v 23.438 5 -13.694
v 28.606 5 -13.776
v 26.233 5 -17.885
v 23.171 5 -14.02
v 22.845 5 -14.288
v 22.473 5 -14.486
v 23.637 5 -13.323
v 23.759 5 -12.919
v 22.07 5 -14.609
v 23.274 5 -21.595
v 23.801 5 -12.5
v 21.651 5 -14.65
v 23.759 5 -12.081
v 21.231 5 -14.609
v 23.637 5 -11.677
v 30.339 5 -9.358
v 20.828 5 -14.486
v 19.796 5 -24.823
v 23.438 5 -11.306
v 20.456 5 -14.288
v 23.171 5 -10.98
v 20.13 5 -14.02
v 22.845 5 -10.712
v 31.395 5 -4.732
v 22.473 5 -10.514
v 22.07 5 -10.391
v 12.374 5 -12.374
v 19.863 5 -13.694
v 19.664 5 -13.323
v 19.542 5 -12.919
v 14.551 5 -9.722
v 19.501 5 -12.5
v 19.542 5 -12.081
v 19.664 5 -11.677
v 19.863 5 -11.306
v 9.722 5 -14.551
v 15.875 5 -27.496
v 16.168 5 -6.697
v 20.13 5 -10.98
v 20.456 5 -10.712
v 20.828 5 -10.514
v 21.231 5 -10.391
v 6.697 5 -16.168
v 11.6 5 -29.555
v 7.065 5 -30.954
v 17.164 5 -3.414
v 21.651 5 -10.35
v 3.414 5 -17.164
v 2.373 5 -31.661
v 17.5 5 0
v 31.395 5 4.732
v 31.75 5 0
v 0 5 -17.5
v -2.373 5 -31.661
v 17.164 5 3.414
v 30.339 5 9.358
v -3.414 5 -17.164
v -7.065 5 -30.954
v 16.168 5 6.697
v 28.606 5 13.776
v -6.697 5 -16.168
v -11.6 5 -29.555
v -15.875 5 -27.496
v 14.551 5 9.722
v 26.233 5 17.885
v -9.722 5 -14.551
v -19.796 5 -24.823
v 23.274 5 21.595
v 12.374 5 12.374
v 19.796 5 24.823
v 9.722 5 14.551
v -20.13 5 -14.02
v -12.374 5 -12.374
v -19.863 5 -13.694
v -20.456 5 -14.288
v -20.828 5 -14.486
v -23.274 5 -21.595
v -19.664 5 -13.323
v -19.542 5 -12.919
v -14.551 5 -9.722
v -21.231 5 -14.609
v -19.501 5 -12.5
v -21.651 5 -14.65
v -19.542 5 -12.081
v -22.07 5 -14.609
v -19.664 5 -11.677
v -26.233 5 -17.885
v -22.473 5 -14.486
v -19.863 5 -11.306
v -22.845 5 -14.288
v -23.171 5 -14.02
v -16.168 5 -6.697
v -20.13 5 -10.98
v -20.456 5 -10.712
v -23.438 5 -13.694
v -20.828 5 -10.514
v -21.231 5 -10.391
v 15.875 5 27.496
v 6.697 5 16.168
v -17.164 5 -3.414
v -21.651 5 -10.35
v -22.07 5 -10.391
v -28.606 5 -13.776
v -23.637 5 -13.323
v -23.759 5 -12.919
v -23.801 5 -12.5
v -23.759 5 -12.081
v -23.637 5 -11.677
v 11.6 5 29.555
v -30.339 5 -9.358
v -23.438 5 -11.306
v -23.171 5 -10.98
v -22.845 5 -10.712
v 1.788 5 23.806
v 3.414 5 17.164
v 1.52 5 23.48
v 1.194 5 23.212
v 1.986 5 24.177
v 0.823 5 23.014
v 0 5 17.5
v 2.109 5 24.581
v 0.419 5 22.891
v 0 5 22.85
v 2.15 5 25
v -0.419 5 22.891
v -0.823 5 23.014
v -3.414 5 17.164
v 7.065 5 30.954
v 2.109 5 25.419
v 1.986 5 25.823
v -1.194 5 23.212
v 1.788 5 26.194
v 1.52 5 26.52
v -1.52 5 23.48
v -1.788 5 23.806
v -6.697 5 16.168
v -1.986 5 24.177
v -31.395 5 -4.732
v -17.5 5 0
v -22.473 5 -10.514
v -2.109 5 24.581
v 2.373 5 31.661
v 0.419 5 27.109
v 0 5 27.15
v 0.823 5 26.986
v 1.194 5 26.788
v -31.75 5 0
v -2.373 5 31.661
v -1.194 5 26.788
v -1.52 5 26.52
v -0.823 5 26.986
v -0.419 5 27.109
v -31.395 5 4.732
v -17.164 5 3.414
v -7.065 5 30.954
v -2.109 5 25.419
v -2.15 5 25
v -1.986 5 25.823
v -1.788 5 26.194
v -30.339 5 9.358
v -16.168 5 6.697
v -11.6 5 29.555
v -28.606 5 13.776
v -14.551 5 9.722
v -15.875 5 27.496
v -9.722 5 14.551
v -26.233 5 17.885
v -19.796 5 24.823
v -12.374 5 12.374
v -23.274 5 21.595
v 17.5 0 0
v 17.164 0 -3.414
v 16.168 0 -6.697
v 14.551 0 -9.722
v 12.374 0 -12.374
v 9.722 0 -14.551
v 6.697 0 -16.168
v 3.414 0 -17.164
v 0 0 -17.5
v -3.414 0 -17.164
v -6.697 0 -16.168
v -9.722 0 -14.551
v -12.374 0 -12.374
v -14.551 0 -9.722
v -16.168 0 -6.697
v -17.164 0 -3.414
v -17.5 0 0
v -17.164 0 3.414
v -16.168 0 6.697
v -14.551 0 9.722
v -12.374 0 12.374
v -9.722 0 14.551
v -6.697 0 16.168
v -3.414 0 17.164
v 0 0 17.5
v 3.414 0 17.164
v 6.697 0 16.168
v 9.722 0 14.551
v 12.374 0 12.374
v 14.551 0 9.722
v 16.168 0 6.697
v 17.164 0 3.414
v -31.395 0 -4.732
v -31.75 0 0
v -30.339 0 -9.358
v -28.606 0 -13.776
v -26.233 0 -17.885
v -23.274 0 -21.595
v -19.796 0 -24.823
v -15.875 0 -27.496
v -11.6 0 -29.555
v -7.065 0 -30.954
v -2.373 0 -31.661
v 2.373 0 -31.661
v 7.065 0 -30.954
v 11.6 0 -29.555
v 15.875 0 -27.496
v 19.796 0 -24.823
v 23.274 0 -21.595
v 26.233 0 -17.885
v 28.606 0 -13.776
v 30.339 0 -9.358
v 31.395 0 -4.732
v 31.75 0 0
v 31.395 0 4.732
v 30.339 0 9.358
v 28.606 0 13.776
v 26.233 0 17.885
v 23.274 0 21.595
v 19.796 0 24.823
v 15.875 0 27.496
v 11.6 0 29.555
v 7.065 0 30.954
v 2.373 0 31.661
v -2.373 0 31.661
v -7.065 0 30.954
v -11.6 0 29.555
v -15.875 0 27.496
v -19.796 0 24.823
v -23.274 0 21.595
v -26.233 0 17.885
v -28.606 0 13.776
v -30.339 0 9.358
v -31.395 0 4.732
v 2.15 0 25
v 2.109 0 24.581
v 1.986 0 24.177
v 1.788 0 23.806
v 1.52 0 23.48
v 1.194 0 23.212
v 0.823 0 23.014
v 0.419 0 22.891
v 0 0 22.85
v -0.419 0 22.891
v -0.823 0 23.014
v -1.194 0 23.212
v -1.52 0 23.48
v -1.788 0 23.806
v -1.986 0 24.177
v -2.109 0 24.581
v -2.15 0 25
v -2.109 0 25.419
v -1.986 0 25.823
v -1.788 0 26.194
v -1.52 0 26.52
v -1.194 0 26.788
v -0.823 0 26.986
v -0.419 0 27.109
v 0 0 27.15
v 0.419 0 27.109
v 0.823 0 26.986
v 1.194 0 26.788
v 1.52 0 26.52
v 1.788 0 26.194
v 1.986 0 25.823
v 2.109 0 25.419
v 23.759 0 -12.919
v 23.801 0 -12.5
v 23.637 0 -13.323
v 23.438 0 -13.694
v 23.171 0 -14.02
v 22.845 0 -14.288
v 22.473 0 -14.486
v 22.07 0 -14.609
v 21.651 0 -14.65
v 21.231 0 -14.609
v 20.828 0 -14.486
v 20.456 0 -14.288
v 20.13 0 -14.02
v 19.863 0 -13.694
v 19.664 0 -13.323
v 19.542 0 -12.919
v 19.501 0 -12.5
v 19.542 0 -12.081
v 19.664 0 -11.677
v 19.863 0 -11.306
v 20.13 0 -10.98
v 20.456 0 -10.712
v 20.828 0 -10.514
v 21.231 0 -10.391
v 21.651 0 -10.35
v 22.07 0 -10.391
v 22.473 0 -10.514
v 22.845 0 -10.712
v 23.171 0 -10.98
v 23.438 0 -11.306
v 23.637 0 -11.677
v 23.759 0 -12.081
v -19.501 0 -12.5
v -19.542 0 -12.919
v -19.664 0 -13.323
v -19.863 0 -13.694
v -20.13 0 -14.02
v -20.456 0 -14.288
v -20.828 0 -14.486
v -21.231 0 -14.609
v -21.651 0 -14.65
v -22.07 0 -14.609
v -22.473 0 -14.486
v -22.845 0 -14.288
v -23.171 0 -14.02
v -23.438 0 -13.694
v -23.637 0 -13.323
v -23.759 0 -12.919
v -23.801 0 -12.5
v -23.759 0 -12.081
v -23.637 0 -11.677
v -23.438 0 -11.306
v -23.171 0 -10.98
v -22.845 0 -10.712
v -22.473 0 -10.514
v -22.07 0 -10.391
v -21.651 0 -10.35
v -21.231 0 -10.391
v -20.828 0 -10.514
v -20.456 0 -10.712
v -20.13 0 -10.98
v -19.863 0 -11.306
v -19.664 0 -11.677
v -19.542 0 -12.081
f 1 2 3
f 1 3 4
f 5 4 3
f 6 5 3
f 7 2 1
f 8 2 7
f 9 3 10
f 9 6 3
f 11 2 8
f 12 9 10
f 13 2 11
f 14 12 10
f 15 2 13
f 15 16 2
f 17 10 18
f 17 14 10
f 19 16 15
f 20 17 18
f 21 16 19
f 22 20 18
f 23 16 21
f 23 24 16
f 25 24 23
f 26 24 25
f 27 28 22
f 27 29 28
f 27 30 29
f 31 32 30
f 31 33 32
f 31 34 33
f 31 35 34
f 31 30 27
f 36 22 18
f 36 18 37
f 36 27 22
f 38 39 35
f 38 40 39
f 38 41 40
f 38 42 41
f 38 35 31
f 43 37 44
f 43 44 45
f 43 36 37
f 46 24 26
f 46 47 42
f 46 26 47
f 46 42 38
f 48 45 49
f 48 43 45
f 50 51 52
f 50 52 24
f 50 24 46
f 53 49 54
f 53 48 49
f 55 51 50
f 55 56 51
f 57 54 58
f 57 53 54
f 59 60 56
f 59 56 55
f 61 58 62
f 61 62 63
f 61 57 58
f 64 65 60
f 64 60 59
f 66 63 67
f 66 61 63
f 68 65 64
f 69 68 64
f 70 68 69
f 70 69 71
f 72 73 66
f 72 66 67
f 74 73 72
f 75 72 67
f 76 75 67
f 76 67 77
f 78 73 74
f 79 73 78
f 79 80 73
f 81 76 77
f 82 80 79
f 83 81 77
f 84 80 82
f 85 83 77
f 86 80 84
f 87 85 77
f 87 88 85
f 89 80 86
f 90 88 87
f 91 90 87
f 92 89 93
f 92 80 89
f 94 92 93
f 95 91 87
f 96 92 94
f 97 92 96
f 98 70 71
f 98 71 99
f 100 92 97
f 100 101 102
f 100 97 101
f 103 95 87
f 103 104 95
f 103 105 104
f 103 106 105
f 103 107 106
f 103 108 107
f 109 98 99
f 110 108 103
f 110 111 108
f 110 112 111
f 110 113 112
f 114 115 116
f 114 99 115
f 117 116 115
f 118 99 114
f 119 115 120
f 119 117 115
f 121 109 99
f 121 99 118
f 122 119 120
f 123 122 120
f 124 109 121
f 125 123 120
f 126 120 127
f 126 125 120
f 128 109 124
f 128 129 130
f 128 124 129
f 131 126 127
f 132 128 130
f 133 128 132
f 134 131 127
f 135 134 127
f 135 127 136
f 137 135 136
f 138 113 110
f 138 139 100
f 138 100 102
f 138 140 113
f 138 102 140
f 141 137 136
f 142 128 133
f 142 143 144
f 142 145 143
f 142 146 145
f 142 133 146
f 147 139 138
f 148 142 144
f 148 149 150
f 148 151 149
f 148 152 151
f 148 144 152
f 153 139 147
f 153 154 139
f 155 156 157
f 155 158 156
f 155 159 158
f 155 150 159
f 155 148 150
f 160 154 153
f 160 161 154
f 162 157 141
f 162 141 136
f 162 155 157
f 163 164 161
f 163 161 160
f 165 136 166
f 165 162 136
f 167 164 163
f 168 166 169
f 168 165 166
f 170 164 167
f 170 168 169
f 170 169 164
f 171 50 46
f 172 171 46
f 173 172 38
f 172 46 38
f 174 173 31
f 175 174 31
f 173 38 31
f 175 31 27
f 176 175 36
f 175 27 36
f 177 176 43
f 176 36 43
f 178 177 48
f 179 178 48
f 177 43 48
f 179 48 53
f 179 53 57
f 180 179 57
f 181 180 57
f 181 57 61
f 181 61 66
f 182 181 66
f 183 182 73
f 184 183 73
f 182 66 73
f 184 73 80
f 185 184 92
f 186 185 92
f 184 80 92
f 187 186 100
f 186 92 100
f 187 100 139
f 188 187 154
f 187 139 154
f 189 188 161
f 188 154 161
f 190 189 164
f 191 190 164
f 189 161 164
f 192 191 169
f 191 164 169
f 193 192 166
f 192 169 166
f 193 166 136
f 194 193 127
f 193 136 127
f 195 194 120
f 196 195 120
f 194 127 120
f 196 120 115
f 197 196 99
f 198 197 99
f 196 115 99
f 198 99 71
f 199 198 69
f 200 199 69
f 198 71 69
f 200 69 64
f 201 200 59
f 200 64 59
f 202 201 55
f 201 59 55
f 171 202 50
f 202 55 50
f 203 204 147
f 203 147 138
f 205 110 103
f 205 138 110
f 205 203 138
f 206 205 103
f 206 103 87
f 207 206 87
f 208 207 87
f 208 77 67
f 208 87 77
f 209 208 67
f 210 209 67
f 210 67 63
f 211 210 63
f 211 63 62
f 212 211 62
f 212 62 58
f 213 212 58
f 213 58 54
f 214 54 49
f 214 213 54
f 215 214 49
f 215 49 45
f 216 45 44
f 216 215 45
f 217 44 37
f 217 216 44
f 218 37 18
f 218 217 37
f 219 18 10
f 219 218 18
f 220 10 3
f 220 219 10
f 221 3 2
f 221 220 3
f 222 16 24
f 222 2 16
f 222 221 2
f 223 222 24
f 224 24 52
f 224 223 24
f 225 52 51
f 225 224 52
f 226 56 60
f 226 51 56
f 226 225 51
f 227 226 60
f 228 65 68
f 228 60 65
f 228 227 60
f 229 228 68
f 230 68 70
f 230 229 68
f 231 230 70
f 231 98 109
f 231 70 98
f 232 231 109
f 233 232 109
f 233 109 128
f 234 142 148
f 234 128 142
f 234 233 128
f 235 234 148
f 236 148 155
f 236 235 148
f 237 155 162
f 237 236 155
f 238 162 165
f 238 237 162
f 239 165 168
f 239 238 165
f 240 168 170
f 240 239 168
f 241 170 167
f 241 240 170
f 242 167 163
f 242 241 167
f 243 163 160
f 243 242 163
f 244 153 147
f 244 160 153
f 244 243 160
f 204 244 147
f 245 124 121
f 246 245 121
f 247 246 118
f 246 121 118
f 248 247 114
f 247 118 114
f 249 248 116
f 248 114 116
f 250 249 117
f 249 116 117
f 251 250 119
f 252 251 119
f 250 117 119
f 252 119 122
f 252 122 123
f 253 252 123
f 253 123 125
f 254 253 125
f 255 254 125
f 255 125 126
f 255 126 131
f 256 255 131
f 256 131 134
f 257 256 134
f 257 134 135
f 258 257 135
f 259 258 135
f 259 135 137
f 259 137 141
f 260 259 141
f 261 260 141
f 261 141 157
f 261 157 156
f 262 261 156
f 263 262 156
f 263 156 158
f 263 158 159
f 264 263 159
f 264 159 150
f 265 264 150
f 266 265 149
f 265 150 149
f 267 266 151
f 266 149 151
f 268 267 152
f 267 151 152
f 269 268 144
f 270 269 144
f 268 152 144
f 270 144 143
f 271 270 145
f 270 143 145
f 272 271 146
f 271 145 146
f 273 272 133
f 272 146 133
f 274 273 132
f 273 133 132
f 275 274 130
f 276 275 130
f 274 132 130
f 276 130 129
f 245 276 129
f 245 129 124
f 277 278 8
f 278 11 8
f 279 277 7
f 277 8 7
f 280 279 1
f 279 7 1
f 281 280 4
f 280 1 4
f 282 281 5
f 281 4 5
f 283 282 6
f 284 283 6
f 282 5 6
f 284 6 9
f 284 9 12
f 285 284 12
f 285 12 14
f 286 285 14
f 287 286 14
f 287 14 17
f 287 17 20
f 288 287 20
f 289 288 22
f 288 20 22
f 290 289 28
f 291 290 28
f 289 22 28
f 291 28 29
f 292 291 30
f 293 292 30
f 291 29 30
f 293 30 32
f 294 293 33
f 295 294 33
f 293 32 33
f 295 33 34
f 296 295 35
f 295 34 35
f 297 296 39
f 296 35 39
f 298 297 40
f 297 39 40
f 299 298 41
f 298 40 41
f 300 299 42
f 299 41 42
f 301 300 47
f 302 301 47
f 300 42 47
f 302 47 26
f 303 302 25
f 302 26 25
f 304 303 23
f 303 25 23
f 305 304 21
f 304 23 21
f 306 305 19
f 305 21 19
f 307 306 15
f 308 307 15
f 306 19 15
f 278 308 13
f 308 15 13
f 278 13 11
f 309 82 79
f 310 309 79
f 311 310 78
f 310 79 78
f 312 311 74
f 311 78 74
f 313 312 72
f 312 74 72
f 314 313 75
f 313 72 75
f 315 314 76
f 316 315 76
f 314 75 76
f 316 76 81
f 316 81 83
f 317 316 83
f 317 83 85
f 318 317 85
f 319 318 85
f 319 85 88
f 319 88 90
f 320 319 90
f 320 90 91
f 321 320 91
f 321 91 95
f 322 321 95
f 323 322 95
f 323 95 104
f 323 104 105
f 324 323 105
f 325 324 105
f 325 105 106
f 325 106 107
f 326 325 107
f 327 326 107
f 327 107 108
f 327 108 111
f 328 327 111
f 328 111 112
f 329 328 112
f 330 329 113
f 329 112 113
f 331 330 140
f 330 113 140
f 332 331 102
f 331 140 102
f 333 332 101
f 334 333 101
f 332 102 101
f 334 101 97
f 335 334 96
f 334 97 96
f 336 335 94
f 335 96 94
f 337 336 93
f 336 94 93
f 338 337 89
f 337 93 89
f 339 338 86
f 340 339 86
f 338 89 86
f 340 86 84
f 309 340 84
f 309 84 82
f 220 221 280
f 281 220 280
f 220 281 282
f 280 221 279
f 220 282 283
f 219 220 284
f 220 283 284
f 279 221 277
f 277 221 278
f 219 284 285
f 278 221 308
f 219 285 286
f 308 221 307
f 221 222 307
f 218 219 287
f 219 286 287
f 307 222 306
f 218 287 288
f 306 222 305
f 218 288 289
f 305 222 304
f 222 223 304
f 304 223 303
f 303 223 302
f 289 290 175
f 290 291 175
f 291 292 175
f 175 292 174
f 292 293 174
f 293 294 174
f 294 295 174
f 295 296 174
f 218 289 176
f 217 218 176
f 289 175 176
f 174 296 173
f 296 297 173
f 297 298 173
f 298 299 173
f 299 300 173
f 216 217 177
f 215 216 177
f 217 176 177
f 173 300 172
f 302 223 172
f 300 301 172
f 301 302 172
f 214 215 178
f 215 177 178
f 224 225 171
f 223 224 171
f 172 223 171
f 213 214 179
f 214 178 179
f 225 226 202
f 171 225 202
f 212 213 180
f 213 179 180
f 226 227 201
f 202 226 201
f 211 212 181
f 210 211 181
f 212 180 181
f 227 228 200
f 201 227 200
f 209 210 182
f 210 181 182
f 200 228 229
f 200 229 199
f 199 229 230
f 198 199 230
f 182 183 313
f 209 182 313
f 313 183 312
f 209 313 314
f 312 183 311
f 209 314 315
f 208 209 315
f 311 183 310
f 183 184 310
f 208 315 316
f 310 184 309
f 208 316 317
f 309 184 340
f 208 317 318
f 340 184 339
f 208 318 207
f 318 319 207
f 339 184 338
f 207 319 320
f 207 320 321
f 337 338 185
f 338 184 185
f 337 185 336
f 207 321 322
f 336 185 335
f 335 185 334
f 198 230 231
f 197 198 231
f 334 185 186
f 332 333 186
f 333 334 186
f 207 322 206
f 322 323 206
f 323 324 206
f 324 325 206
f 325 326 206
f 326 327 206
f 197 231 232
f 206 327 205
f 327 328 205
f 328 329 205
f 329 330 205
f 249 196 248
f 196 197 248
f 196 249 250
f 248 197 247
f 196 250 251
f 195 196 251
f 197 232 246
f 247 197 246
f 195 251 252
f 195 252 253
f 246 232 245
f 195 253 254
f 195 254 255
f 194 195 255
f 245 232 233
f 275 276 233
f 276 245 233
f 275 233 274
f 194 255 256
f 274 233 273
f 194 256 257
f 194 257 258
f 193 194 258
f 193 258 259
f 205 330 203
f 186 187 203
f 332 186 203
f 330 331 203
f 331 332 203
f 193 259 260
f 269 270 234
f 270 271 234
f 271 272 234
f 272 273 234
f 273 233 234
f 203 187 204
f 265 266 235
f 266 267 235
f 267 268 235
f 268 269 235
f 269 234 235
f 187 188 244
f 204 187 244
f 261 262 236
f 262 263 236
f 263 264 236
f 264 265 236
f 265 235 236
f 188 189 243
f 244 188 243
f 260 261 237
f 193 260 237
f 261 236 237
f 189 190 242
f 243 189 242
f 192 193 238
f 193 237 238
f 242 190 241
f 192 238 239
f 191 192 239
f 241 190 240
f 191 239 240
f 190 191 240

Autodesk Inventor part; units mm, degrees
ref_plane "YZ Plane" through (0, 0, 0) normal (1, 0, 0) x (0, 1, 0)
ref_plane "XZ Plane" through (0, 0, 0) normal (0, 1, 0) x (-1, 0, 0)
ref_plane "XY Plane" through (0, 0, 0) normal (0, 0, 1) x (1, 0, 0)
sketch "スケッチ1" plane through (0, 0, 0) normal (0, 1, 0) x (-1, 0, 0)
  circle A0 centre (0, 0) radius 31.75
  dimension "d0" = 63.5
extrude "押し出し1" add sketch "スケッチ1" along normal blind 5
sketch "スケッチ4" plane through (0, 5, 0) normal (0, 1, 0) x (1, 0, 0)
  circle A0 centre (0, 0) radius 17.5
  dimension "d9" = 35
extrude "押し出し4" cut sketch "スケッチ4" against normal through all
sketch "スケッチ6" plane through (0, 5, 0) normal (0, 1, 0) x (1, 0, 0)
  circle A0 centre (0, 0) radius 25 construction
  circle A1 centre (21.6506, 12.5) radius 2.15
  line L0 (0, 0) -> (21.6506, 12.5) construction
  line L1 (0, 0) -> (35.9214, 0) construction
  circle A2 centre (-21.6506, 12.5) radius 2.15
  circle A3 centre (0, -25) radius 2.15
  dimension "d19" = 50
  dimension "d20" = 4.3
  dimension "d21" = 30
  dimension "d24" = 360
extrude "押し出し6" cut sketch "スケッチ6" against normal through all
properties part number "B_probe_bearing_without_holes" material "PAEK 樹脂"
